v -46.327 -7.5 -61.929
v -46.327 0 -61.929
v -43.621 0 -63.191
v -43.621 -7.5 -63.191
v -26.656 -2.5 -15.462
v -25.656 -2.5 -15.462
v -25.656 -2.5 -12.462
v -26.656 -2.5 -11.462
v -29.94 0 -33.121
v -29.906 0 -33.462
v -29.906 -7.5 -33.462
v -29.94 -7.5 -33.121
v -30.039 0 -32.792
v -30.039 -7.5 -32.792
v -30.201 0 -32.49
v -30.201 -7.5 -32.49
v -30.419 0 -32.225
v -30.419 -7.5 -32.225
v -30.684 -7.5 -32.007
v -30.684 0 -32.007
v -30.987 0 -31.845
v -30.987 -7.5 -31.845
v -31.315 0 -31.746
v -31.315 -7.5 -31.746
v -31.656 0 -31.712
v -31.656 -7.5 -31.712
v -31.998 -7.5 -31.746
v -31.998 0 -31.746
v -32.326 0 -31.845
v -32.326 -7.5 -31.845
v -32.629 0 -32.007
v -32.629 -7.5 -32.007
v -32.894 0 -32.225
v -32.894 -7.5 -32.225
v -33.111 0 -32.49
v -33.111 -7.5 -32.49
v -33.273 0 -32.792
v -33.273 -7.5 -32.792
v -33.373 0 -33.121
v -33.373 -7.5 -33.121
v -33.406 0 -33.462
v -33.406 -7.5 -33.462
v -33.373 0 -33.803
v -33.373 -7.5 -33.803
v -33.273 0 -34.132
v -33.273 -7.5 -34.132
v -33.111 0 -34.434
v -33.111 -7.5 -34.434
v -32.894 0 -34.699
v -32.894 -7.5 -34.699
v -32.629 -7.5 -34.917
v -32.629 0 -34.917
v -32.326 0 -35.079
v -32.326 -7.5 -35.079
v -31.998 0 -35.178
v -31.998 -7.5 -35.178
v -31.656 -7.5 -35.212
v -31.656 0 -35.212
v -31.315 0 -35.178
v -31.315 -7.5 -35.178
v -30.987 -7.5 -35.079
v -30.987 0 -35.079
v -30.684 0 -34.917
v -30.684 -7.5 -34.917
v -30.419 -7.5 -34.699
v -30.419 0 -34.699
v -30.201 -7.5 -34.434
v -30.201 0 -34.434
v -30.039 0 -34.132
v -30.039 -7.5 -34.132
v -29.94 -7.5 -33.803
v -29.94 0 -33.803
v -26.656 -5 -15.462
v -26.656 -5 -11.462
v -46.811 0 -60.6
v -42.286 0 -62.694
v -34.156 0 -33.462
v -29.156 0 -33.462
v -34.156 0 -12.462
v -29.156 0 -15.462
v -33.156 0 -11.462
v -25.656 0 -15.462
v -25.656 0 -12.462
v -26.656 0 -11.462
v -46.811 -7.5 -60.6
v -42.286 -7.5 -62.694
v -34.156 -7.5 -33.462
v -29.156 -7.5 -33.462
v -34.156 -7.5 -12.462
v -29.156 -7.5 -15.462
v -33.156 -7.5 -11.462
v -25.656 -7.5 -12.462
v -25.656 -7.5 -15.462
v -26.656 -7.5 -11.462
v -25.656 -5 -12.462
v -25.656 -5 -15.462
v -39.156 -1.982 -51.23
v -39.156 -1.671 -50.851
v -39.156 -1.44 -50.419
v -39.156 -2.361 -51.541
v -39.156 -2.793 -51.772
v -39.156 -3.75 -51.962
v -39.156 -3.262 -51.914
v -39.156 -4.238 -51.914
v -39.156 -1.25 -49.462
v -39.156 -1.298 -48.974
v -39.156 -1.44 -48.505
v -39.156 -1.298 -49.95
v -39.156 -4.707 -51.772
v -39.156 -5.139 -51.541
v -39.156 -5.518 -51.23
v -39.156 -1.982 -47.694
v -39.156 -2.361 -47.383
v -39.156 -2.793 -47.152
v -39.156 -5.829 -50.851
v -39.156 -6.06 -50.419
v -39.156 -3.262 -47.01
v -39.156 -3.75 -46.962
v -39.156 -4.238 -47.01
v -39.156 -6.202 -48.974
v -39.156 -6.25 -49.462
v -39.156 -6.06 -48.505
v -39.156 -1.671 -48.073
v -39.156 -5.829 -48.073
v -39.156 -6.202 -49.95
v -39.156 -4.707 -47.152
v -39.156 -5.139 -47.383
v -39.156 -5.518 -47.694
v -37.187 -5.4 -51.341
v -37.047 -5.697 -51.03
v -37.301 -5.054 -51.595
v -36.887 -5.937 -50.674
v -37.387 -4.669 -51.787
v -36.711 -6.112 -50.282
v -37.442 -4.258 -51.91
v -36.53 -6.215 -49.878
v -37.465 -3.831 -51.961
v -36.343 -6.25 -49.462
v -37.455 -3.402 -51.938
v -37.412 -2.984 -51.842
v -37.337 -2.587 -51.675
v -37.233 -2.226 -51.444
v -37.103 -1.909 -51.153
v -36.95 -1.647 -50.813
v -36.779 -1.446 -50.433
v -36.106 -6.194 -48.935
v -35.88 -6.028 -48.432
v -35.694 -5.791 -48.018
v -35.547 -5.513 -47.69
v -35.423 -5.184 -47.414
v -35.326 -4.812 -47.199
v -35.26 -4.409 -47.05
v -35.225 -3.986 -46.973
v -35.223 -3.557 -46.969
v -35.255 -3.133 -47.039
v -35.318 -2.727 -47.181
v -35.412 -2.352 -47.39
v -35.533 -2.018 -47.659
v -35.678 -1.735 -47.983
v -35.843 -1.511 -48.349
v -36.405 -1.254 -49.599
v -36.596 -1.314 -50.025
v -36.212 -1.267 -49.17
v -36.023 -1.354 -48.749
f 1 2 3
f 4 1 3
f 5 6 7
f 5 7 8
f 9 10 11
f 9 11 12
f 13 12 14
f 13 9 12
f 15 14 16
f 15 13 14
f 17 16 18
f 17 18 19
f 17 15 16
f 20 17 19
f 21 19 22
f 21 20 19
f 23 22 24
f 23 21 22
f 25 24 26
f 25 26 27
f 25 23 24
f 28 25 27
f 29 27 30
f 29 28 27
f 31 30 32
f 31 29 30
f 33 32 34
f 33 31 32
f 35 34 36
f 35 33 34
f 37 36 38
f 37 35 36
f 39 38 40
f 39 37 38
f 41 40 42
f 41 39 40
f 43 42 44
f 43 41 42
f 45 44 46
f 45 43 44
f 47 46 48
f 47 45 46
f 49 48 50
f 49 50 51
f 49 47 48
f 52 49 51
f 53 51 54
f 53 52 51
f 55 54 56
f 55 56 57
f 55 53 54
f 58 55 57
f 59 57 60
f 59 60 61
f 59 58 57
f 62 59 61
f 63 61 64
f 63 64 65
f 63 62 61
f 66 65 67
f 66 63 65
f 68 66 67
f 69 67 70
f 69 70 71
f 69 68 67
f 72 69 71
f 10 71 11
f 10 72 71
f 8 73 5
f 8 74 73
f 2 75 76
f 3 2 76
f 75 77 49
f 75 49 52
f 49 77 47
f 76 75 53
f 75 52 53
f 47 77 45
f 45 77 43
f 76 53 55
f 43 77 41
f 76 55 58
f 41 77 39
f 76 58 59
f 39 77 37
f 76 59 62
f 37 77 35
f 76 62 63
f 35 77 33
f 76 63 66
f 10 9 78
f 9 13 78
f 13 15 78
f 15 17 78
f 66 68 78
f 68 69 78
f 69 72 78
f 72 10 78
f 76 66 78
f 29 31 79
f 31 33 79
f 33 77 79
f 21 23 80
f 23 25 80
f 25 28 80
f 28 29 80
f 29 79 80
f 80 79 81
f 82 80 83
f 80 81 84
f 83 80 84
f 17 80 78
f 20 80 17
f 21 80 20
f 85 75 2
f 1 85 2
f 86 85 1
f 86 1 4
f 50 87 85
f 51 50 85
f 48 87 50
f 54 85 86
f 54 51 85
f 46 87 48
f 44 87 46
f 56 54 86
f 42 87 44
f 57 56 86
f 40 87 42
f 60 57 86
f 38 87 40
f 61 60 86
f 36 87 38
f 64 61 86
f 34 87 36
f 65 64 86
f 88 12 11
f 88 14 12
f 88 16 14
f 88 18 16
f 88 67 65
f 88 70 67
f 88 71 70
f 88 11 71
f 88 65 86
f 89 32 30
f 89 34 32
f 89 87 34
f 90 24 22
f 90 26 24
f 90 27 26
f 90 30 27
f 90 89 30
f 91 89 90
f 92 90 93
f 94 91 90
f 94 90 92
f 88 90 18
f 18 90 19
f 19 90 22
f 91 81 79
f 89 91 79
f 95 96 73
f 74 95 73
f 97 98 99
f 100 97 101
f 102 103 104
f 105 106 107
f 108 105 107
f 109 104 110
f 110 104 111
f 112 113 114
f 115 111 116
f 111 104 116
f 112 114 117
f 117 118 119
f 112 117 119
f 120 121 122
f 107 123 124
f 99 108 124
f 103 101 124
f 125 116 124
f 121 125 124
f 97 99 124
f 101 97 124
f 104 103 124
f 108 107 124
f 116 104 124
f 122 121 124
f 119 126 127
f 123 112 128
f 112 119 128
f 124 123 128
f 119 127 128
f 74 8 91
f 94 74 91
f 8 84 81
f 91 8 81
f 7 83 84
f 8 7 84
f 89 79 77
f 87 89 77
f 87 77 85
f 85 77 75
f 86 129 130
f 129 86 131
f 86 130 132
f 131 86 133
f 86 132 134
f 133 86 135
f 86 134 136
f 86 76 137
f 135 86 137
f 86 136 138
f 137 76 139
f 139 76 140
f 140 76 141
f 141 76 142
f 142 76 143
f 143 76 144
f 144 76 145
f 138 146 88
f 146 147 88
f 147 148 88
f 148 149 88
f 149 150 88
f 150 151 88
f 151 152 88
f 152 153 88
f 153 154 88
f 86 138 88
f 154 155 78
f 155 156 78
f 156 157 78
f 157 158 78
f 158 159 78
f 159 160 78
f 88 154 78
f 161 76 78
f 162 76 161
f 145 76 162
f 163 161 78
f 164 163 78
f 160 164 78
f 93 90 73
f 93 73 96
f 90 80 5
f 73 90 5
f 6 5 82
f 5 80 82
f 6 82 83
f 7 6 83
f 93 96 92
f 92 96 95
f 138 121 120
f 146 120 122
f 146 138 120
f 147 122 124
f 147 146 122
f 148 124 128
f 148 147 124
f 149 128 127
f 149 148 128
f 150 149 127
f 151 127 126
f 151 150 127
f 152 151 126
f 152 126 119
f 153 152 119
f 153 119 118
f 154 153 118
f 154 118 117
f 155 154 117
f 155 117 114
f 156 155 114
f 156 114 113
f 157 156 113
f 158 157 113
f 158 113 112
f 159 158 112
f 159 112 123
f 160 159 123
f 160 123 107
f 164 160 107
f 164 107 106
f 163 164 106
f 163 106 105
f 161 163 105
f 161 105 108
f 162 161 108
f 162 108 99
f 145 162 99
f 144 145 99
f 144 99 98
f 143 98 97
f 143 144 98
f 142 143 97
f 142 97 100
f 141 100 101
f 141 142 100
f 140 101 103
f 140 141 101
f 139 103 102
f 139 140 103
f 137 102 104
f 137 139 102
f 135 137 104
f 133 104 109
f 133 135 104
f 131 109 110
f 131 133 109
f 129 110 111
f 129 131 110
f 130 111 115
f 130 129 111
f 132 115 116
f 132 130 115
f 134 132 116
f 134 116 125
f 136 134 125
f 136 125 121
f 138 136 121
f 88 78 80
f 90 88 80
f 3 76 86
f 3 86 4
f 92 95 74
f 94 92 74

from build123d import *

# Parameters (mm, degrees)
F0_R        = 1.75
F1_DEPTH    = 7.5
F2_T1_DEPTH = 12.6433659759
F2_T3_DEPTH = 12.7137209508
F3_R        = 2.5
F4_DEPTH    = 5
F5_W        = 2.5
F5_H        = 3
F6_DEPTH    = 1
F7_W        = 1
F7_H        = 2.5
F8_DEPTH    = 25


# Not quite as in the source:
# - a fillet or chamfer that OpenCascade refuses, or shapes differently, is made with other operations: its cross-section is extruded or revolved along the edge and cut away or added


with BuildPart() as f1:
    # F0 (on Front) → F1 (new body)
    with BuildSketch(Plane.XZ):
        Polygon((-29.1562567131, -15.4619954874), (-25.6562567131, -15.4619954874), (-25.6562567131, -11.4619954874), (-34.1562567131, -11.4619954874), (-34.1562567131, -33.4619954874), (-47.2335256009, -61.5062891187), (-42.7019866657, -63.6193804274), (-29.1562567131, -33.4619954874), align=None)
        with Locations((-31.6562567131, -33.4619954874)):
            Circle(F0_R, mode=Mode.SUBTRACT)
    extrude(amount=F1_DEPTH)

    # F2: chamfer of 1 on 4 edges, made by hand

    # F2_s2 → F2_t1 (cut)
    with BuildSketch(Plane.XZ.offset(-2.571682988)):
        Polygon((-33.1562567131, -11.4619954874), (-34.1562567131, -12.4619954874), (-34.1562567131, -11.4619954874), align=None)
        Polygon((-25.6562567131, -12.4619954874), (-26.6562567131, -11.4619954874), (-25.6562567131, -11.4619954874), align=None)
        Polygon((-46.8109073392, -60.5999813317), (-46.3272178139, -61.9289073804), (-47.2335256009, -61.5062891187), align=None)
    extrude(amount=F2_T1_DEPTH, mode=Mode.SUBTRACT)

    # F2_s4 → F2_t3 (cut)
    with BuildSketch(Plane.XZ.offset(-2.6068604754)):
        Polygon((-42.2864056117, -62.6941561786), (-43.6212292029, -63.1907305926), (-42.7019866657, -63.6193804274), align=None)
    extrude(amount=F2_T3_DEPTH, mode=Mode.SUBTRACT)

    # F3 (on face) → F4 (cut)
    with BuildSketch(Plane(origin=(-34.1562567131, 0, 0), x_dir=(0, -1, 0), z_dir=(-1, 0, 0))):
        with Locations((3.75, -49.4619954874)):
            Circle(F3_R)
    extrude(amount=F4_DEPTH, mode=Mode.SUBTRACT)

    # F5 (on face) → F6 (cut)
    with BuildSketch(Plane.YZ.offset(-25.6562567131)):
        with Locations((-3.75, -13.9619954874)):
            Rectangle(F5_W, F5_H)
    extrude(amount=-F6_DEPTH, mode=Mode.SUBTRACT)

    # F7 (on face) → F8 (cut)
    with BuildSketch(Plane(origin=(0, 0, -12.4619954874), x_dir=(1, 0, 0), z_dir=(0, 0, -1))):
        with Locations((-26.1562567131, 3.75)):
            Rectangle(F7_W, F7_H)
    extrude(amount=-F8_DEPTH, mode=Mode.SUBTRACT)


solid = f1.part
